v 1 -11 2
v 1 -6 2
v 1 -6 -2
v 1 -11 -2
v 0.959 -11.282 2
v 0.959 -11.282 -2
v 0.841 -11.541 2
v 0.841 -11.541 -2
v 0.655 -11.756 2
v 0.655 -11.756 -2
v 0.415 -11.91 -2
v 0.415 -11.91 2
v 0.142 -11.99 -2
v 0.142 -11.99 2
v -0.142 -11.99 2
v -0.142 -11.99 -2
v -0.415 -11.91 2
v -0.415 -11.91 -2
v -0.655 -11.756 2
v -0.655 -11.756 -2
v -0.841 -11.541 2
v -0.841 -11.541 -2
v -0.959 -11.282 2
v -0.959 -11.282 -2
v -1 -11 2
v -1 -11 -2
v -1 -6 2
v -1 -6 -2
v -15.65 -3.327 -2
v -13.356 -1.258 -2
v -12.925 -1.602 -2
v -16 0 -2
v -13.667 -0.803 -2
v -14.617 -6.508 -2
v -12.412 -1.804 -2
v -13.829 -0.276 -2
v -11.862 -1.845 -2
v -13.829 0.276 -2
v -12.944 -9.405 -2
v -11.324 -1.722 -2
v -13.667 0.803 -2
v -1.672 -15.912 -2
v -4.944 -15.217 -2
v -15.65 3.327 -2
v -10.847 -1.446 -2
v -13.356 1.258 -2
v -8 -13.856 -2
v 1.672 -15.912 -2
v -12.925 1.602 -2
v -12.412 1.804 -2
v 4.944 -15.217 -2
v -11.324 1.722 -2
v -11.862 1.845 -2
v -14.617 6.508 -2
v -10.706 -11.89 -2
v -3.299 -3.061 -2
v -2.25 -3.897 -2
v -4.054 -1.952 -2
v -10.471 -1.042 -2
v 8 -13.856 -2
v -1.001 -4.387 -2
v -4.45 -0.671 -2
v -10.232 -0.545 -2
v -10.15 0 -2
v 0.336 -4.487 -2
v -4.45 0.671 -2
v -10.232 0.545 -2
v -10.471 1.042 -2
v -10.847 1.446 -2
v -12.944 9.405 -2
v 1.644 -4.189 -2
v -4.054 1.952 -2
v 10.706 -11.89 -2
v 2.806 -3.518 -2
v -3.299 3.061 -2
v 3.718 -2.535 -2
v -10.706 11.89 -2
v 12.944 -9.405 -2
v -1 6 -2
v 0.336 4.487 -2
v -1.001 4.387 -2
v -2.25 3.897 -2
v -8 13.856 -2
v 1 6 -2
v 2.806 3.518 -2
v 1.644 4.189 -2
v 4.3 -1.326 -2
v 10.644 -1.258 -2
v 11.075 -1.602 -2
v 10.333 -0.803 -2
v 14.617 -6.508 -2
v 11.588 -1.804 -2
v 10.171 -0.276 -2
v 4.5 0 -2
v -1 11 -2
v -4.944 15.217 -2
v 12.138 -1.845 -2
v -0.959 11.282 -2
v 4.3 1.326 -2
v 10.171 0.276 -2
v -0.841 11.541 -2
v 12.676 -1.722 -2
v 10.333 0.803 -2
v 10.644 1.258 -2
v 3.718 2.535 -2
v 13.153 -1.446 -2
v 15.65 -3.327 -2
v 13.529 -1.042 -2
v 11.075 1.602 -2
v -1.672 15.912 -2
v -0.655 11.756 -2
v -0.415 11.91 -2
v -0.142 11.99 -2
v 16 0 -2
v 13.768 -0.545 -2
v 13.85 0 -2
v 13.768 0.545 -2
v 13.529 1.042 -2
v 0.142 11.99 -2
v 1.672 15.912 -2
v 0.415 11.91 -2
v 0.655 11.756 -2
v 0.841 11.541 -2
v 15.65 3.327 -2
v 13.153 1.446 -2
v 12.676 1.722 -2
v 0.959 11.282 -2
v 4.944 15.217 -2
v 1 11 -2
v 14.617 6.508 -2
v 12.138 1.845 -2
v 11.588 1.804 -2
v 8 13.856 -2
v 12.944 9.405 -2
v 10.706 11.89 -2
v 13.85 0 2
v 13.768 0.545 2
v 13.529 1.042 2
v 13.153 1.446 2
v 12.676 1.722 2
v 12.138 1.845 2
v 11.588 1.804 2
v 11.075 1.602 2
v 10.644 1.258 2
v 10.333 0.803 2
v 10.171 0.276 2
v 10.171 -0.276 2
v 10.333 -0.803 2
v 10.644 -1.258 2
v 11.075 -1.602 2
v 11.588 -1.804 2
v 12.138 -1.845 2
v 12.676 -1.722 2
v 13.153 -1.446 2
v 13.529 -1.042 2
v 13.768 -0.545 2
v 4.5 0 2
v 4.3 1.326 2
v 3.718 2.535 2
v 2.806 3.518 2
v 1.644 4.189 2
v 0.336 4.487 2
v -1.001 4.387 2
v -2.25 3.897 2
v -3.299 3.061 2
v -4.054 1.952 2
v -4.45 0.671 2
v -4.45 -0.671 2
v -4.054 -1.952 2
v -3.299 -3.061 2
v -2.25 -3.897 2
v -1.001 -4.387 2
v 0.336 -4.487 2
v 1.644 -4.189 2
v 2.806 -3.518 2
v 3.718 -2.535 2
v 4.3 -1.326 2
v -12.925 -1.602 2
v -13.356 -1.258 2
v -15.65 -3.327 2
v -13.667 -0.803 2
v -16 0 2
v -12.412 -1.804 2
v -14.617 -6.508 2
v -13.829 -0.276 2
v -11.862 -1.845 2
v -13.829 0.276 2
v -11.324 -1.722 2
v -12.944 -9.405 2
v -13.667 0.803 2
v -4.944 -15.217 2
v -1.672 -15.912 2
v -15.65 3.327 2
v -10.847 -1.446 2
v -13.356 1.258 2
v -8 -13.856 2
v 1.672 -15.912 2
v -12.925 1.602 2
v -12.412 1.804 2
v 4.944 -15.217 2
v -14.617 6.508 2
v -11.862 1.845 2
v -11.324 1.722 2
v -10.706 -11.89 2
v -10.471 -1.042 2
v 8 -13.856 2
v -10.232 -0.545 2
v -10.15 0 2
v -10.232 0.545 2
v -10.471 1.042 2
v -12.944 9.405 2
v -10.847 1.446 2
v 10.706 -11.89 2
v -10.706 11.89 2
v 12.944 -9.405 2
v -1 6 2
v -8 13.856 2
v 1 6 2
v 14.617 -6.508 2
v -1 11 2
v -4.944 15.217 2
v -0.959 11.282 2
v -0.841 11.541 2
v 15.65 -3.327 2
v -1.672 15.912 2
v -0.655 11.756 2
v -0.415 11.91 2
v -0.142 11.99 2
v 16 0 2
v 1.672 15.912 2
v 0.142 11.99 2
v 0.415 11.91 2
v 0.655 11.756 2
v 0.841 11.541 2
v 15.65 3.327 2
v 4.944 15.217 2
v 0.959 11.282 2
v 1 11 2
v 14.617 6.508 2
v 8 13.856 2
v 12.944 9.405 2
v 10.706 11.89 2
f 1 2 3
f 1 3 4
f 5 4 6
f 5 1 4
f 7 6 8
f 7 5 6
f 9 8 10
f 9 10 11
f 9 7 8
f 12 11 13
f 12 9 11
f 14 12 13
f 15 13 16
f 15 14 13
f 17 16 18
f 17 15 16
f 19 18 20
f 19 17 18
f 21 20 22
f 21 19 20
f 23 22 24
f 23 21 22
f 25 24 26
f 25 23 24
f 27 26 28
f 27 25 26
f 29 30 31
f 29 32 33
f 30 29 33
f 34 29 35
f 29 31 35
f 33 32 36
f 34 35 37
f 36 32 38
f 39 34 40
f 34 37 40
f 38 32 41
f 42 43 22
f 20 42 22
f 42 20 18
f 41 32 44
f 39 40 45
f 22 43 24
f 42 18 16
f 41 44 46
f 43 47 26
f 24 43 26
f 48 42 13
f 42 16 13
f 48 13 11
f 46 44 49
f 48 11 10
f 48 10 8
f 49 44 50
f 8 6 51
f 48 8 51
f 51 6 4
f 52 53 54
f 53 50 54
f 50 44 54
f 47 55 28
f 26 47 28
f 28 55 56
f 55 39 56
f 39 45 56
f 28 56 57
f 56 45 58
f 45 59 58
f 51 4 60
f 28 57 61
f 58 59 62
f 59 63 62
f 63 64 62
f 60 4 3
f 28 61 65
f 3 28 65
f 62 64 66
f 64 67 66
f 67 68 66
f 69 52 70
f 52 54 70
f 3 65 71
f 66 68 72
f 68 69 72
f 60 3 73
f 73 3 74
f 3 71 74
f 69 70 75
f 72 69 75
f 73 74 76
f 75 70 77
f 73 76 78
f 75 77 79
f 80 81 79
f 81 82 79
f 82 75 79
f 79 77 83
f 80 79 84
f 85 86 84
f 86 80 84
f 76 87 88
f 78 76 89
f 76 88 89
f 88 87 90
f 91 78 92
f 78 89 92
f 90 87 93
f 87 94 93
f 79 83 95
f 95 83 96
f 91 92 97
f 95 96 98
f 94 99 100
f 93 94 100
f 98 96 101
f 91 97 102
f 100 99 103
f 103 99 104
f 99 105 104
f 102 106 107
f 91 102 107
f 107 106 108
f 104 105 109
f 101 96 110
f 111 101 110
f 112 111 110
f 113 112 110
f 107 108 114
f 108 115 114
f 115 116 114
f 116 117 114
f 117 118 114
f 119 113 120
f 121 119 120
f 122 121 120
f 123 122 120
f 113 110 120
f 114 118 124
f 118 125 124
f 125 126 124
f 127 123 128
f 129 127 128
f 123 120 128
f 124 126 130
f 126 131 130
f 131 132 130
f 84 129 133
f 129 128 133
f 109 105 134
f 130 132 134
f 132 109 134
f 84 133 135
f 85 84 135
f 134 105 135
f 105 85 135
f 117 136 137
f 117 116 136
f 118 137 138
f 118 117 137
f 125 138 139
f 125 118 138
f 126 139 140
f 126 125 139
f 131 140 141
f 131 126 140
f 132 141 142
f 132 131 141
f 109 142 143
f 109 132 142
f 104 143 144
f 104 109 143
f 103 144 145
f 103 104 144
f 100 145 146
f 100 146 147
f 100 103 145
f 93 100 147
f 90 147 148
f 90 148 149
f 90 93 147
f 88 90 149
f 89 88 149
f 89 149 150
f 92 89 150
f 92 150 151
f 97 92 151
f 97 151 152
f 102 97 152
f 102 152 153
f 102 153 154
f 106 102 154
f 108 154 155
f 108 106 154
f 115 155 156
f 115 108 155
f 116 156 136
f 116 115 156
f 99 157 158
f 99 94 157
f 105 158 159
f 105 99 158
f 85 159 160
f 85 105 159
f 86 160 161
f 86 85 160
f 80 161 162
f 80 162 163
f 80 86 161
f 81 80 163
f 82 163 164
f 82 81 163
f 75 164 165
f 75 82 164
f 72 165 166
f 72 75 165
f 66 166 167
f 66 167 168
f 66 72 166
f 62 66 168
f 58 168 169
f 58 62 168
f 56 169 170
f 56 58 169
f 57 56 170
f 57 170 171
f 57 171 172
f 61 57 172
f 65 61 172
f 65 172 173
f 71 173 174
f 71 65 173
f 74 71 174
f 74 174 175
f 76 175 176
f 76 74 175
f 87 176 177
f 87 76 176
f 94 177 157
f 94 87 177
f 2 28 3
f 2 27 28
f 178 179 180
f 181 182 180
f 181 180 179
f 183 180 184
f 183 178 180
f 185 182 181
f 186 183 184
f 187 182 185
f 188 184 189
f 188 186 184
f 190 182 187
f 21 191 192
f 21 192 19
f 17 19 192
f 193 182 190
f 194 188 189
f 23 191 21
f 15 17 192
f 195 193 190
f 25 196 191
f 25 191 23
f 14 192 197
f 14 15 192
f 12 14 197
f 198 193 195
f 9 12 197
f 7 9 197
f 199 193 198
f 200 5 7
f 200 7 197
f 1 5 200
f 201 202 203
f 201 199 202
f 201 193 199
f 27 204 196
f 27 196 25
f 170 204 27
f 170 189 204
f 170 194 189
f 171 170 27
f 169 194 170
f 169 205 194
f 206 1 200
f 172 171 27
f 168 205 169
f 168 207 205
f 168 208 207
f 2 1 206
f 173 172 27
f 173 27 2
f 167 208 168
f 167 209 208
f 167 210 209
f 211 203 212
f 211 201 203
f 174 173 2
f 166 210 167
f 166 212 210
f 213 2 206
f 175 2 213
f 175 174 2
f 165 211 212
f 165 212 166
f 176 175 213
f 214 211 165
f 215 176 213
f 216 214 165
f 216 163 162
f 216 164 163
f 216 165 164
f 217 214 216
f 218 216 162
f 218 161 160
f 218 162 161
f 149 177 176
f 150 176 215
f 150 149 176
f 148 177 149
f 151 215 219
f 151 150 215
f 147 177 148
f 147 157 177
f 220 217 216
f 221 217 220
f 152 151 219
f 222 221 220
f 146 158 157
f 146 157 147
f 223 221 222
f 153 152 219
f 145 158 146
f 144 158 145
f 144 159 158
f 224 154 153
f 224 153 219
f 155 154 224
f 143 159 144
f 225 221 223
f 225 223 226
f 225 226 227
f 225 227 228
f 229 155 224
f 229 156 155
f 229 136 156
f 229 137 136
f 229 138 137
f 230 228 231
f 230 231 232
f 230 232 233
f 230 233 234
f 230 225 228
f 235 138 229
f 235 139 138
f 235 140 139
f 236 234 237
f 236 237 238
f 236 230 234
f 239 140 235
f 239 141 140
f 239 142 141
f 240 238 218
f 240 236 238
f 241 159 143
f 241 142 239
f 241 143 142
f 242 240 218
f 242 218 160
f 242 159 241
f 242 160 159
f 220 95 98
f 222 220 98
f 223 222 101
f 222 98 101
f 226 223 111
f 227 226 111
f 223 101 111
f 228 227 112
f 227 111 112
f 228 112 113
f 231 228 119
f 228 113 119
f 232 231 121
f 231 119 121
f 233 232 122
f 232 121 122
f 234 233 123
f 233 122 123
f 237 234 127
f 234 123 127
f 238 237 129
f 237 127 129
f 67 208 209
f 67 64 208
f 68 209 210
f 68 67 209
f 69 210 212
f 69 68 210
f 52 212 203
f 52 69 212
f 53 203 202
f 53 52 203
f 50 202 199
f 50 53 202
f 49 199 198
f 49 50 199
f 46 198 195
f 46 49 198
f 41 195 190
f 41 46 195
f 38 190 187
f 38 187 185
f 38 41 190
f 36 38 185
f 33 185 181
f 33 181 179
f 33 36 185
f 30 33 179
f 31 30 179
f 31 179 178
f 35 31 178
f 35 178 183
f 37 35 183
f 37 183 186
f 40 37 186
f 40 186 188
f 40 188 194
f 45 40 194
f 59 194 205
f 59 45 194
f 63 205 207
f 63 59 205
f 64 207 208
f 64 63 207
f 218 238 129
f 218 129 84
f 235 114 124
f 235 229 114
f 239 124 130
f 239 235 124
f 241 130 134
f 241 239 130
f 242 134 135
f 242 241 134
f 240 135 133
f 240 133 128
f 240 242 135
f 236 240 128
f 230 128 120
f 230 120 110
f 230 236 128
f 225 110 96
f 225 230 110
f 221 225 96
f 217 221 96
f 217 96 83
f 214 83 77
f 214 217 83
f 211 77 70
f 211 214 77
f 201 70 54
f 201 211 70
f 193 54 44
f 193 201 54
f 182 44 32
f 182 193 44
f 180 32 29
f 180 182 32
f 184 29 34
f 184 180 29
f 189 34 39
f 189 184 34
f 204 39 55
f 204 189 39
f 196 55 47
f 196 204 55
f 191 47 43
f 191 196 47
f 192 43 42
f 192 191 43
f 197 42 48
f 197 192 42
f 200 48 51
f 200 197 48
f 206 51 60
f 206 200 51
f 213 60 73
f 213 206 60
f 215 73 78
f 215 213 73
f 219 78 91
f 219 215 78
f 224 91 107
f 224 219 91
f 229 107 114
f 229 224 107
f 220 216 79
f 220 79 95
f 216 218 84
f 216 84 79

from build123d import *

# Parameters (mm, degrees)
SKETCH_1_R      = 16
SKETCH_1_R_2    = 4.5
SKETCH_1_R_3    = 1.85
EXTRUDE_1_DEPTH = 2


with BuildPart() as part:
    # 草图1 → 凸台-拉伸1 (new, symmetric)
    with BuildSketch(Plane.XY):
        Circle(SKETCH_1_R)
        Circle(SKETCH_1_R_2, mode=Mode.SUBTRACT)
        with Locations((-12, 0)):
            Circle(SKETCH_1_R_3, mode=Mode.SUBTRACT)
        with Locations((12, 0)):
            Circle(SKETCH_1_R_3, mode=Mode.SUBTRACT)
        with BuildLine():
            Line((-1, 6), (-1, 11))
            ThreePointArc((-1, 11), (0, 12), (1, 11))
            Line((1, 11), (1, 6))
            Line((1, 6), (-1, 6))
        make_face(mode=Mode.SUBTRACT)
        with BuildLine():
            Line((1, -6), (1, -11))
            ThreePointArc((1, -11), (0, -12), (-1, -11))
            Line((-1, -11), (-1, -6))
            Line((-1, -6), (1, -6))
        make_face(mode=Mode.SUBTRACT)
    extrude(amount=EXTRUDE_1_DEPTH, both=True)


solid = part.part
